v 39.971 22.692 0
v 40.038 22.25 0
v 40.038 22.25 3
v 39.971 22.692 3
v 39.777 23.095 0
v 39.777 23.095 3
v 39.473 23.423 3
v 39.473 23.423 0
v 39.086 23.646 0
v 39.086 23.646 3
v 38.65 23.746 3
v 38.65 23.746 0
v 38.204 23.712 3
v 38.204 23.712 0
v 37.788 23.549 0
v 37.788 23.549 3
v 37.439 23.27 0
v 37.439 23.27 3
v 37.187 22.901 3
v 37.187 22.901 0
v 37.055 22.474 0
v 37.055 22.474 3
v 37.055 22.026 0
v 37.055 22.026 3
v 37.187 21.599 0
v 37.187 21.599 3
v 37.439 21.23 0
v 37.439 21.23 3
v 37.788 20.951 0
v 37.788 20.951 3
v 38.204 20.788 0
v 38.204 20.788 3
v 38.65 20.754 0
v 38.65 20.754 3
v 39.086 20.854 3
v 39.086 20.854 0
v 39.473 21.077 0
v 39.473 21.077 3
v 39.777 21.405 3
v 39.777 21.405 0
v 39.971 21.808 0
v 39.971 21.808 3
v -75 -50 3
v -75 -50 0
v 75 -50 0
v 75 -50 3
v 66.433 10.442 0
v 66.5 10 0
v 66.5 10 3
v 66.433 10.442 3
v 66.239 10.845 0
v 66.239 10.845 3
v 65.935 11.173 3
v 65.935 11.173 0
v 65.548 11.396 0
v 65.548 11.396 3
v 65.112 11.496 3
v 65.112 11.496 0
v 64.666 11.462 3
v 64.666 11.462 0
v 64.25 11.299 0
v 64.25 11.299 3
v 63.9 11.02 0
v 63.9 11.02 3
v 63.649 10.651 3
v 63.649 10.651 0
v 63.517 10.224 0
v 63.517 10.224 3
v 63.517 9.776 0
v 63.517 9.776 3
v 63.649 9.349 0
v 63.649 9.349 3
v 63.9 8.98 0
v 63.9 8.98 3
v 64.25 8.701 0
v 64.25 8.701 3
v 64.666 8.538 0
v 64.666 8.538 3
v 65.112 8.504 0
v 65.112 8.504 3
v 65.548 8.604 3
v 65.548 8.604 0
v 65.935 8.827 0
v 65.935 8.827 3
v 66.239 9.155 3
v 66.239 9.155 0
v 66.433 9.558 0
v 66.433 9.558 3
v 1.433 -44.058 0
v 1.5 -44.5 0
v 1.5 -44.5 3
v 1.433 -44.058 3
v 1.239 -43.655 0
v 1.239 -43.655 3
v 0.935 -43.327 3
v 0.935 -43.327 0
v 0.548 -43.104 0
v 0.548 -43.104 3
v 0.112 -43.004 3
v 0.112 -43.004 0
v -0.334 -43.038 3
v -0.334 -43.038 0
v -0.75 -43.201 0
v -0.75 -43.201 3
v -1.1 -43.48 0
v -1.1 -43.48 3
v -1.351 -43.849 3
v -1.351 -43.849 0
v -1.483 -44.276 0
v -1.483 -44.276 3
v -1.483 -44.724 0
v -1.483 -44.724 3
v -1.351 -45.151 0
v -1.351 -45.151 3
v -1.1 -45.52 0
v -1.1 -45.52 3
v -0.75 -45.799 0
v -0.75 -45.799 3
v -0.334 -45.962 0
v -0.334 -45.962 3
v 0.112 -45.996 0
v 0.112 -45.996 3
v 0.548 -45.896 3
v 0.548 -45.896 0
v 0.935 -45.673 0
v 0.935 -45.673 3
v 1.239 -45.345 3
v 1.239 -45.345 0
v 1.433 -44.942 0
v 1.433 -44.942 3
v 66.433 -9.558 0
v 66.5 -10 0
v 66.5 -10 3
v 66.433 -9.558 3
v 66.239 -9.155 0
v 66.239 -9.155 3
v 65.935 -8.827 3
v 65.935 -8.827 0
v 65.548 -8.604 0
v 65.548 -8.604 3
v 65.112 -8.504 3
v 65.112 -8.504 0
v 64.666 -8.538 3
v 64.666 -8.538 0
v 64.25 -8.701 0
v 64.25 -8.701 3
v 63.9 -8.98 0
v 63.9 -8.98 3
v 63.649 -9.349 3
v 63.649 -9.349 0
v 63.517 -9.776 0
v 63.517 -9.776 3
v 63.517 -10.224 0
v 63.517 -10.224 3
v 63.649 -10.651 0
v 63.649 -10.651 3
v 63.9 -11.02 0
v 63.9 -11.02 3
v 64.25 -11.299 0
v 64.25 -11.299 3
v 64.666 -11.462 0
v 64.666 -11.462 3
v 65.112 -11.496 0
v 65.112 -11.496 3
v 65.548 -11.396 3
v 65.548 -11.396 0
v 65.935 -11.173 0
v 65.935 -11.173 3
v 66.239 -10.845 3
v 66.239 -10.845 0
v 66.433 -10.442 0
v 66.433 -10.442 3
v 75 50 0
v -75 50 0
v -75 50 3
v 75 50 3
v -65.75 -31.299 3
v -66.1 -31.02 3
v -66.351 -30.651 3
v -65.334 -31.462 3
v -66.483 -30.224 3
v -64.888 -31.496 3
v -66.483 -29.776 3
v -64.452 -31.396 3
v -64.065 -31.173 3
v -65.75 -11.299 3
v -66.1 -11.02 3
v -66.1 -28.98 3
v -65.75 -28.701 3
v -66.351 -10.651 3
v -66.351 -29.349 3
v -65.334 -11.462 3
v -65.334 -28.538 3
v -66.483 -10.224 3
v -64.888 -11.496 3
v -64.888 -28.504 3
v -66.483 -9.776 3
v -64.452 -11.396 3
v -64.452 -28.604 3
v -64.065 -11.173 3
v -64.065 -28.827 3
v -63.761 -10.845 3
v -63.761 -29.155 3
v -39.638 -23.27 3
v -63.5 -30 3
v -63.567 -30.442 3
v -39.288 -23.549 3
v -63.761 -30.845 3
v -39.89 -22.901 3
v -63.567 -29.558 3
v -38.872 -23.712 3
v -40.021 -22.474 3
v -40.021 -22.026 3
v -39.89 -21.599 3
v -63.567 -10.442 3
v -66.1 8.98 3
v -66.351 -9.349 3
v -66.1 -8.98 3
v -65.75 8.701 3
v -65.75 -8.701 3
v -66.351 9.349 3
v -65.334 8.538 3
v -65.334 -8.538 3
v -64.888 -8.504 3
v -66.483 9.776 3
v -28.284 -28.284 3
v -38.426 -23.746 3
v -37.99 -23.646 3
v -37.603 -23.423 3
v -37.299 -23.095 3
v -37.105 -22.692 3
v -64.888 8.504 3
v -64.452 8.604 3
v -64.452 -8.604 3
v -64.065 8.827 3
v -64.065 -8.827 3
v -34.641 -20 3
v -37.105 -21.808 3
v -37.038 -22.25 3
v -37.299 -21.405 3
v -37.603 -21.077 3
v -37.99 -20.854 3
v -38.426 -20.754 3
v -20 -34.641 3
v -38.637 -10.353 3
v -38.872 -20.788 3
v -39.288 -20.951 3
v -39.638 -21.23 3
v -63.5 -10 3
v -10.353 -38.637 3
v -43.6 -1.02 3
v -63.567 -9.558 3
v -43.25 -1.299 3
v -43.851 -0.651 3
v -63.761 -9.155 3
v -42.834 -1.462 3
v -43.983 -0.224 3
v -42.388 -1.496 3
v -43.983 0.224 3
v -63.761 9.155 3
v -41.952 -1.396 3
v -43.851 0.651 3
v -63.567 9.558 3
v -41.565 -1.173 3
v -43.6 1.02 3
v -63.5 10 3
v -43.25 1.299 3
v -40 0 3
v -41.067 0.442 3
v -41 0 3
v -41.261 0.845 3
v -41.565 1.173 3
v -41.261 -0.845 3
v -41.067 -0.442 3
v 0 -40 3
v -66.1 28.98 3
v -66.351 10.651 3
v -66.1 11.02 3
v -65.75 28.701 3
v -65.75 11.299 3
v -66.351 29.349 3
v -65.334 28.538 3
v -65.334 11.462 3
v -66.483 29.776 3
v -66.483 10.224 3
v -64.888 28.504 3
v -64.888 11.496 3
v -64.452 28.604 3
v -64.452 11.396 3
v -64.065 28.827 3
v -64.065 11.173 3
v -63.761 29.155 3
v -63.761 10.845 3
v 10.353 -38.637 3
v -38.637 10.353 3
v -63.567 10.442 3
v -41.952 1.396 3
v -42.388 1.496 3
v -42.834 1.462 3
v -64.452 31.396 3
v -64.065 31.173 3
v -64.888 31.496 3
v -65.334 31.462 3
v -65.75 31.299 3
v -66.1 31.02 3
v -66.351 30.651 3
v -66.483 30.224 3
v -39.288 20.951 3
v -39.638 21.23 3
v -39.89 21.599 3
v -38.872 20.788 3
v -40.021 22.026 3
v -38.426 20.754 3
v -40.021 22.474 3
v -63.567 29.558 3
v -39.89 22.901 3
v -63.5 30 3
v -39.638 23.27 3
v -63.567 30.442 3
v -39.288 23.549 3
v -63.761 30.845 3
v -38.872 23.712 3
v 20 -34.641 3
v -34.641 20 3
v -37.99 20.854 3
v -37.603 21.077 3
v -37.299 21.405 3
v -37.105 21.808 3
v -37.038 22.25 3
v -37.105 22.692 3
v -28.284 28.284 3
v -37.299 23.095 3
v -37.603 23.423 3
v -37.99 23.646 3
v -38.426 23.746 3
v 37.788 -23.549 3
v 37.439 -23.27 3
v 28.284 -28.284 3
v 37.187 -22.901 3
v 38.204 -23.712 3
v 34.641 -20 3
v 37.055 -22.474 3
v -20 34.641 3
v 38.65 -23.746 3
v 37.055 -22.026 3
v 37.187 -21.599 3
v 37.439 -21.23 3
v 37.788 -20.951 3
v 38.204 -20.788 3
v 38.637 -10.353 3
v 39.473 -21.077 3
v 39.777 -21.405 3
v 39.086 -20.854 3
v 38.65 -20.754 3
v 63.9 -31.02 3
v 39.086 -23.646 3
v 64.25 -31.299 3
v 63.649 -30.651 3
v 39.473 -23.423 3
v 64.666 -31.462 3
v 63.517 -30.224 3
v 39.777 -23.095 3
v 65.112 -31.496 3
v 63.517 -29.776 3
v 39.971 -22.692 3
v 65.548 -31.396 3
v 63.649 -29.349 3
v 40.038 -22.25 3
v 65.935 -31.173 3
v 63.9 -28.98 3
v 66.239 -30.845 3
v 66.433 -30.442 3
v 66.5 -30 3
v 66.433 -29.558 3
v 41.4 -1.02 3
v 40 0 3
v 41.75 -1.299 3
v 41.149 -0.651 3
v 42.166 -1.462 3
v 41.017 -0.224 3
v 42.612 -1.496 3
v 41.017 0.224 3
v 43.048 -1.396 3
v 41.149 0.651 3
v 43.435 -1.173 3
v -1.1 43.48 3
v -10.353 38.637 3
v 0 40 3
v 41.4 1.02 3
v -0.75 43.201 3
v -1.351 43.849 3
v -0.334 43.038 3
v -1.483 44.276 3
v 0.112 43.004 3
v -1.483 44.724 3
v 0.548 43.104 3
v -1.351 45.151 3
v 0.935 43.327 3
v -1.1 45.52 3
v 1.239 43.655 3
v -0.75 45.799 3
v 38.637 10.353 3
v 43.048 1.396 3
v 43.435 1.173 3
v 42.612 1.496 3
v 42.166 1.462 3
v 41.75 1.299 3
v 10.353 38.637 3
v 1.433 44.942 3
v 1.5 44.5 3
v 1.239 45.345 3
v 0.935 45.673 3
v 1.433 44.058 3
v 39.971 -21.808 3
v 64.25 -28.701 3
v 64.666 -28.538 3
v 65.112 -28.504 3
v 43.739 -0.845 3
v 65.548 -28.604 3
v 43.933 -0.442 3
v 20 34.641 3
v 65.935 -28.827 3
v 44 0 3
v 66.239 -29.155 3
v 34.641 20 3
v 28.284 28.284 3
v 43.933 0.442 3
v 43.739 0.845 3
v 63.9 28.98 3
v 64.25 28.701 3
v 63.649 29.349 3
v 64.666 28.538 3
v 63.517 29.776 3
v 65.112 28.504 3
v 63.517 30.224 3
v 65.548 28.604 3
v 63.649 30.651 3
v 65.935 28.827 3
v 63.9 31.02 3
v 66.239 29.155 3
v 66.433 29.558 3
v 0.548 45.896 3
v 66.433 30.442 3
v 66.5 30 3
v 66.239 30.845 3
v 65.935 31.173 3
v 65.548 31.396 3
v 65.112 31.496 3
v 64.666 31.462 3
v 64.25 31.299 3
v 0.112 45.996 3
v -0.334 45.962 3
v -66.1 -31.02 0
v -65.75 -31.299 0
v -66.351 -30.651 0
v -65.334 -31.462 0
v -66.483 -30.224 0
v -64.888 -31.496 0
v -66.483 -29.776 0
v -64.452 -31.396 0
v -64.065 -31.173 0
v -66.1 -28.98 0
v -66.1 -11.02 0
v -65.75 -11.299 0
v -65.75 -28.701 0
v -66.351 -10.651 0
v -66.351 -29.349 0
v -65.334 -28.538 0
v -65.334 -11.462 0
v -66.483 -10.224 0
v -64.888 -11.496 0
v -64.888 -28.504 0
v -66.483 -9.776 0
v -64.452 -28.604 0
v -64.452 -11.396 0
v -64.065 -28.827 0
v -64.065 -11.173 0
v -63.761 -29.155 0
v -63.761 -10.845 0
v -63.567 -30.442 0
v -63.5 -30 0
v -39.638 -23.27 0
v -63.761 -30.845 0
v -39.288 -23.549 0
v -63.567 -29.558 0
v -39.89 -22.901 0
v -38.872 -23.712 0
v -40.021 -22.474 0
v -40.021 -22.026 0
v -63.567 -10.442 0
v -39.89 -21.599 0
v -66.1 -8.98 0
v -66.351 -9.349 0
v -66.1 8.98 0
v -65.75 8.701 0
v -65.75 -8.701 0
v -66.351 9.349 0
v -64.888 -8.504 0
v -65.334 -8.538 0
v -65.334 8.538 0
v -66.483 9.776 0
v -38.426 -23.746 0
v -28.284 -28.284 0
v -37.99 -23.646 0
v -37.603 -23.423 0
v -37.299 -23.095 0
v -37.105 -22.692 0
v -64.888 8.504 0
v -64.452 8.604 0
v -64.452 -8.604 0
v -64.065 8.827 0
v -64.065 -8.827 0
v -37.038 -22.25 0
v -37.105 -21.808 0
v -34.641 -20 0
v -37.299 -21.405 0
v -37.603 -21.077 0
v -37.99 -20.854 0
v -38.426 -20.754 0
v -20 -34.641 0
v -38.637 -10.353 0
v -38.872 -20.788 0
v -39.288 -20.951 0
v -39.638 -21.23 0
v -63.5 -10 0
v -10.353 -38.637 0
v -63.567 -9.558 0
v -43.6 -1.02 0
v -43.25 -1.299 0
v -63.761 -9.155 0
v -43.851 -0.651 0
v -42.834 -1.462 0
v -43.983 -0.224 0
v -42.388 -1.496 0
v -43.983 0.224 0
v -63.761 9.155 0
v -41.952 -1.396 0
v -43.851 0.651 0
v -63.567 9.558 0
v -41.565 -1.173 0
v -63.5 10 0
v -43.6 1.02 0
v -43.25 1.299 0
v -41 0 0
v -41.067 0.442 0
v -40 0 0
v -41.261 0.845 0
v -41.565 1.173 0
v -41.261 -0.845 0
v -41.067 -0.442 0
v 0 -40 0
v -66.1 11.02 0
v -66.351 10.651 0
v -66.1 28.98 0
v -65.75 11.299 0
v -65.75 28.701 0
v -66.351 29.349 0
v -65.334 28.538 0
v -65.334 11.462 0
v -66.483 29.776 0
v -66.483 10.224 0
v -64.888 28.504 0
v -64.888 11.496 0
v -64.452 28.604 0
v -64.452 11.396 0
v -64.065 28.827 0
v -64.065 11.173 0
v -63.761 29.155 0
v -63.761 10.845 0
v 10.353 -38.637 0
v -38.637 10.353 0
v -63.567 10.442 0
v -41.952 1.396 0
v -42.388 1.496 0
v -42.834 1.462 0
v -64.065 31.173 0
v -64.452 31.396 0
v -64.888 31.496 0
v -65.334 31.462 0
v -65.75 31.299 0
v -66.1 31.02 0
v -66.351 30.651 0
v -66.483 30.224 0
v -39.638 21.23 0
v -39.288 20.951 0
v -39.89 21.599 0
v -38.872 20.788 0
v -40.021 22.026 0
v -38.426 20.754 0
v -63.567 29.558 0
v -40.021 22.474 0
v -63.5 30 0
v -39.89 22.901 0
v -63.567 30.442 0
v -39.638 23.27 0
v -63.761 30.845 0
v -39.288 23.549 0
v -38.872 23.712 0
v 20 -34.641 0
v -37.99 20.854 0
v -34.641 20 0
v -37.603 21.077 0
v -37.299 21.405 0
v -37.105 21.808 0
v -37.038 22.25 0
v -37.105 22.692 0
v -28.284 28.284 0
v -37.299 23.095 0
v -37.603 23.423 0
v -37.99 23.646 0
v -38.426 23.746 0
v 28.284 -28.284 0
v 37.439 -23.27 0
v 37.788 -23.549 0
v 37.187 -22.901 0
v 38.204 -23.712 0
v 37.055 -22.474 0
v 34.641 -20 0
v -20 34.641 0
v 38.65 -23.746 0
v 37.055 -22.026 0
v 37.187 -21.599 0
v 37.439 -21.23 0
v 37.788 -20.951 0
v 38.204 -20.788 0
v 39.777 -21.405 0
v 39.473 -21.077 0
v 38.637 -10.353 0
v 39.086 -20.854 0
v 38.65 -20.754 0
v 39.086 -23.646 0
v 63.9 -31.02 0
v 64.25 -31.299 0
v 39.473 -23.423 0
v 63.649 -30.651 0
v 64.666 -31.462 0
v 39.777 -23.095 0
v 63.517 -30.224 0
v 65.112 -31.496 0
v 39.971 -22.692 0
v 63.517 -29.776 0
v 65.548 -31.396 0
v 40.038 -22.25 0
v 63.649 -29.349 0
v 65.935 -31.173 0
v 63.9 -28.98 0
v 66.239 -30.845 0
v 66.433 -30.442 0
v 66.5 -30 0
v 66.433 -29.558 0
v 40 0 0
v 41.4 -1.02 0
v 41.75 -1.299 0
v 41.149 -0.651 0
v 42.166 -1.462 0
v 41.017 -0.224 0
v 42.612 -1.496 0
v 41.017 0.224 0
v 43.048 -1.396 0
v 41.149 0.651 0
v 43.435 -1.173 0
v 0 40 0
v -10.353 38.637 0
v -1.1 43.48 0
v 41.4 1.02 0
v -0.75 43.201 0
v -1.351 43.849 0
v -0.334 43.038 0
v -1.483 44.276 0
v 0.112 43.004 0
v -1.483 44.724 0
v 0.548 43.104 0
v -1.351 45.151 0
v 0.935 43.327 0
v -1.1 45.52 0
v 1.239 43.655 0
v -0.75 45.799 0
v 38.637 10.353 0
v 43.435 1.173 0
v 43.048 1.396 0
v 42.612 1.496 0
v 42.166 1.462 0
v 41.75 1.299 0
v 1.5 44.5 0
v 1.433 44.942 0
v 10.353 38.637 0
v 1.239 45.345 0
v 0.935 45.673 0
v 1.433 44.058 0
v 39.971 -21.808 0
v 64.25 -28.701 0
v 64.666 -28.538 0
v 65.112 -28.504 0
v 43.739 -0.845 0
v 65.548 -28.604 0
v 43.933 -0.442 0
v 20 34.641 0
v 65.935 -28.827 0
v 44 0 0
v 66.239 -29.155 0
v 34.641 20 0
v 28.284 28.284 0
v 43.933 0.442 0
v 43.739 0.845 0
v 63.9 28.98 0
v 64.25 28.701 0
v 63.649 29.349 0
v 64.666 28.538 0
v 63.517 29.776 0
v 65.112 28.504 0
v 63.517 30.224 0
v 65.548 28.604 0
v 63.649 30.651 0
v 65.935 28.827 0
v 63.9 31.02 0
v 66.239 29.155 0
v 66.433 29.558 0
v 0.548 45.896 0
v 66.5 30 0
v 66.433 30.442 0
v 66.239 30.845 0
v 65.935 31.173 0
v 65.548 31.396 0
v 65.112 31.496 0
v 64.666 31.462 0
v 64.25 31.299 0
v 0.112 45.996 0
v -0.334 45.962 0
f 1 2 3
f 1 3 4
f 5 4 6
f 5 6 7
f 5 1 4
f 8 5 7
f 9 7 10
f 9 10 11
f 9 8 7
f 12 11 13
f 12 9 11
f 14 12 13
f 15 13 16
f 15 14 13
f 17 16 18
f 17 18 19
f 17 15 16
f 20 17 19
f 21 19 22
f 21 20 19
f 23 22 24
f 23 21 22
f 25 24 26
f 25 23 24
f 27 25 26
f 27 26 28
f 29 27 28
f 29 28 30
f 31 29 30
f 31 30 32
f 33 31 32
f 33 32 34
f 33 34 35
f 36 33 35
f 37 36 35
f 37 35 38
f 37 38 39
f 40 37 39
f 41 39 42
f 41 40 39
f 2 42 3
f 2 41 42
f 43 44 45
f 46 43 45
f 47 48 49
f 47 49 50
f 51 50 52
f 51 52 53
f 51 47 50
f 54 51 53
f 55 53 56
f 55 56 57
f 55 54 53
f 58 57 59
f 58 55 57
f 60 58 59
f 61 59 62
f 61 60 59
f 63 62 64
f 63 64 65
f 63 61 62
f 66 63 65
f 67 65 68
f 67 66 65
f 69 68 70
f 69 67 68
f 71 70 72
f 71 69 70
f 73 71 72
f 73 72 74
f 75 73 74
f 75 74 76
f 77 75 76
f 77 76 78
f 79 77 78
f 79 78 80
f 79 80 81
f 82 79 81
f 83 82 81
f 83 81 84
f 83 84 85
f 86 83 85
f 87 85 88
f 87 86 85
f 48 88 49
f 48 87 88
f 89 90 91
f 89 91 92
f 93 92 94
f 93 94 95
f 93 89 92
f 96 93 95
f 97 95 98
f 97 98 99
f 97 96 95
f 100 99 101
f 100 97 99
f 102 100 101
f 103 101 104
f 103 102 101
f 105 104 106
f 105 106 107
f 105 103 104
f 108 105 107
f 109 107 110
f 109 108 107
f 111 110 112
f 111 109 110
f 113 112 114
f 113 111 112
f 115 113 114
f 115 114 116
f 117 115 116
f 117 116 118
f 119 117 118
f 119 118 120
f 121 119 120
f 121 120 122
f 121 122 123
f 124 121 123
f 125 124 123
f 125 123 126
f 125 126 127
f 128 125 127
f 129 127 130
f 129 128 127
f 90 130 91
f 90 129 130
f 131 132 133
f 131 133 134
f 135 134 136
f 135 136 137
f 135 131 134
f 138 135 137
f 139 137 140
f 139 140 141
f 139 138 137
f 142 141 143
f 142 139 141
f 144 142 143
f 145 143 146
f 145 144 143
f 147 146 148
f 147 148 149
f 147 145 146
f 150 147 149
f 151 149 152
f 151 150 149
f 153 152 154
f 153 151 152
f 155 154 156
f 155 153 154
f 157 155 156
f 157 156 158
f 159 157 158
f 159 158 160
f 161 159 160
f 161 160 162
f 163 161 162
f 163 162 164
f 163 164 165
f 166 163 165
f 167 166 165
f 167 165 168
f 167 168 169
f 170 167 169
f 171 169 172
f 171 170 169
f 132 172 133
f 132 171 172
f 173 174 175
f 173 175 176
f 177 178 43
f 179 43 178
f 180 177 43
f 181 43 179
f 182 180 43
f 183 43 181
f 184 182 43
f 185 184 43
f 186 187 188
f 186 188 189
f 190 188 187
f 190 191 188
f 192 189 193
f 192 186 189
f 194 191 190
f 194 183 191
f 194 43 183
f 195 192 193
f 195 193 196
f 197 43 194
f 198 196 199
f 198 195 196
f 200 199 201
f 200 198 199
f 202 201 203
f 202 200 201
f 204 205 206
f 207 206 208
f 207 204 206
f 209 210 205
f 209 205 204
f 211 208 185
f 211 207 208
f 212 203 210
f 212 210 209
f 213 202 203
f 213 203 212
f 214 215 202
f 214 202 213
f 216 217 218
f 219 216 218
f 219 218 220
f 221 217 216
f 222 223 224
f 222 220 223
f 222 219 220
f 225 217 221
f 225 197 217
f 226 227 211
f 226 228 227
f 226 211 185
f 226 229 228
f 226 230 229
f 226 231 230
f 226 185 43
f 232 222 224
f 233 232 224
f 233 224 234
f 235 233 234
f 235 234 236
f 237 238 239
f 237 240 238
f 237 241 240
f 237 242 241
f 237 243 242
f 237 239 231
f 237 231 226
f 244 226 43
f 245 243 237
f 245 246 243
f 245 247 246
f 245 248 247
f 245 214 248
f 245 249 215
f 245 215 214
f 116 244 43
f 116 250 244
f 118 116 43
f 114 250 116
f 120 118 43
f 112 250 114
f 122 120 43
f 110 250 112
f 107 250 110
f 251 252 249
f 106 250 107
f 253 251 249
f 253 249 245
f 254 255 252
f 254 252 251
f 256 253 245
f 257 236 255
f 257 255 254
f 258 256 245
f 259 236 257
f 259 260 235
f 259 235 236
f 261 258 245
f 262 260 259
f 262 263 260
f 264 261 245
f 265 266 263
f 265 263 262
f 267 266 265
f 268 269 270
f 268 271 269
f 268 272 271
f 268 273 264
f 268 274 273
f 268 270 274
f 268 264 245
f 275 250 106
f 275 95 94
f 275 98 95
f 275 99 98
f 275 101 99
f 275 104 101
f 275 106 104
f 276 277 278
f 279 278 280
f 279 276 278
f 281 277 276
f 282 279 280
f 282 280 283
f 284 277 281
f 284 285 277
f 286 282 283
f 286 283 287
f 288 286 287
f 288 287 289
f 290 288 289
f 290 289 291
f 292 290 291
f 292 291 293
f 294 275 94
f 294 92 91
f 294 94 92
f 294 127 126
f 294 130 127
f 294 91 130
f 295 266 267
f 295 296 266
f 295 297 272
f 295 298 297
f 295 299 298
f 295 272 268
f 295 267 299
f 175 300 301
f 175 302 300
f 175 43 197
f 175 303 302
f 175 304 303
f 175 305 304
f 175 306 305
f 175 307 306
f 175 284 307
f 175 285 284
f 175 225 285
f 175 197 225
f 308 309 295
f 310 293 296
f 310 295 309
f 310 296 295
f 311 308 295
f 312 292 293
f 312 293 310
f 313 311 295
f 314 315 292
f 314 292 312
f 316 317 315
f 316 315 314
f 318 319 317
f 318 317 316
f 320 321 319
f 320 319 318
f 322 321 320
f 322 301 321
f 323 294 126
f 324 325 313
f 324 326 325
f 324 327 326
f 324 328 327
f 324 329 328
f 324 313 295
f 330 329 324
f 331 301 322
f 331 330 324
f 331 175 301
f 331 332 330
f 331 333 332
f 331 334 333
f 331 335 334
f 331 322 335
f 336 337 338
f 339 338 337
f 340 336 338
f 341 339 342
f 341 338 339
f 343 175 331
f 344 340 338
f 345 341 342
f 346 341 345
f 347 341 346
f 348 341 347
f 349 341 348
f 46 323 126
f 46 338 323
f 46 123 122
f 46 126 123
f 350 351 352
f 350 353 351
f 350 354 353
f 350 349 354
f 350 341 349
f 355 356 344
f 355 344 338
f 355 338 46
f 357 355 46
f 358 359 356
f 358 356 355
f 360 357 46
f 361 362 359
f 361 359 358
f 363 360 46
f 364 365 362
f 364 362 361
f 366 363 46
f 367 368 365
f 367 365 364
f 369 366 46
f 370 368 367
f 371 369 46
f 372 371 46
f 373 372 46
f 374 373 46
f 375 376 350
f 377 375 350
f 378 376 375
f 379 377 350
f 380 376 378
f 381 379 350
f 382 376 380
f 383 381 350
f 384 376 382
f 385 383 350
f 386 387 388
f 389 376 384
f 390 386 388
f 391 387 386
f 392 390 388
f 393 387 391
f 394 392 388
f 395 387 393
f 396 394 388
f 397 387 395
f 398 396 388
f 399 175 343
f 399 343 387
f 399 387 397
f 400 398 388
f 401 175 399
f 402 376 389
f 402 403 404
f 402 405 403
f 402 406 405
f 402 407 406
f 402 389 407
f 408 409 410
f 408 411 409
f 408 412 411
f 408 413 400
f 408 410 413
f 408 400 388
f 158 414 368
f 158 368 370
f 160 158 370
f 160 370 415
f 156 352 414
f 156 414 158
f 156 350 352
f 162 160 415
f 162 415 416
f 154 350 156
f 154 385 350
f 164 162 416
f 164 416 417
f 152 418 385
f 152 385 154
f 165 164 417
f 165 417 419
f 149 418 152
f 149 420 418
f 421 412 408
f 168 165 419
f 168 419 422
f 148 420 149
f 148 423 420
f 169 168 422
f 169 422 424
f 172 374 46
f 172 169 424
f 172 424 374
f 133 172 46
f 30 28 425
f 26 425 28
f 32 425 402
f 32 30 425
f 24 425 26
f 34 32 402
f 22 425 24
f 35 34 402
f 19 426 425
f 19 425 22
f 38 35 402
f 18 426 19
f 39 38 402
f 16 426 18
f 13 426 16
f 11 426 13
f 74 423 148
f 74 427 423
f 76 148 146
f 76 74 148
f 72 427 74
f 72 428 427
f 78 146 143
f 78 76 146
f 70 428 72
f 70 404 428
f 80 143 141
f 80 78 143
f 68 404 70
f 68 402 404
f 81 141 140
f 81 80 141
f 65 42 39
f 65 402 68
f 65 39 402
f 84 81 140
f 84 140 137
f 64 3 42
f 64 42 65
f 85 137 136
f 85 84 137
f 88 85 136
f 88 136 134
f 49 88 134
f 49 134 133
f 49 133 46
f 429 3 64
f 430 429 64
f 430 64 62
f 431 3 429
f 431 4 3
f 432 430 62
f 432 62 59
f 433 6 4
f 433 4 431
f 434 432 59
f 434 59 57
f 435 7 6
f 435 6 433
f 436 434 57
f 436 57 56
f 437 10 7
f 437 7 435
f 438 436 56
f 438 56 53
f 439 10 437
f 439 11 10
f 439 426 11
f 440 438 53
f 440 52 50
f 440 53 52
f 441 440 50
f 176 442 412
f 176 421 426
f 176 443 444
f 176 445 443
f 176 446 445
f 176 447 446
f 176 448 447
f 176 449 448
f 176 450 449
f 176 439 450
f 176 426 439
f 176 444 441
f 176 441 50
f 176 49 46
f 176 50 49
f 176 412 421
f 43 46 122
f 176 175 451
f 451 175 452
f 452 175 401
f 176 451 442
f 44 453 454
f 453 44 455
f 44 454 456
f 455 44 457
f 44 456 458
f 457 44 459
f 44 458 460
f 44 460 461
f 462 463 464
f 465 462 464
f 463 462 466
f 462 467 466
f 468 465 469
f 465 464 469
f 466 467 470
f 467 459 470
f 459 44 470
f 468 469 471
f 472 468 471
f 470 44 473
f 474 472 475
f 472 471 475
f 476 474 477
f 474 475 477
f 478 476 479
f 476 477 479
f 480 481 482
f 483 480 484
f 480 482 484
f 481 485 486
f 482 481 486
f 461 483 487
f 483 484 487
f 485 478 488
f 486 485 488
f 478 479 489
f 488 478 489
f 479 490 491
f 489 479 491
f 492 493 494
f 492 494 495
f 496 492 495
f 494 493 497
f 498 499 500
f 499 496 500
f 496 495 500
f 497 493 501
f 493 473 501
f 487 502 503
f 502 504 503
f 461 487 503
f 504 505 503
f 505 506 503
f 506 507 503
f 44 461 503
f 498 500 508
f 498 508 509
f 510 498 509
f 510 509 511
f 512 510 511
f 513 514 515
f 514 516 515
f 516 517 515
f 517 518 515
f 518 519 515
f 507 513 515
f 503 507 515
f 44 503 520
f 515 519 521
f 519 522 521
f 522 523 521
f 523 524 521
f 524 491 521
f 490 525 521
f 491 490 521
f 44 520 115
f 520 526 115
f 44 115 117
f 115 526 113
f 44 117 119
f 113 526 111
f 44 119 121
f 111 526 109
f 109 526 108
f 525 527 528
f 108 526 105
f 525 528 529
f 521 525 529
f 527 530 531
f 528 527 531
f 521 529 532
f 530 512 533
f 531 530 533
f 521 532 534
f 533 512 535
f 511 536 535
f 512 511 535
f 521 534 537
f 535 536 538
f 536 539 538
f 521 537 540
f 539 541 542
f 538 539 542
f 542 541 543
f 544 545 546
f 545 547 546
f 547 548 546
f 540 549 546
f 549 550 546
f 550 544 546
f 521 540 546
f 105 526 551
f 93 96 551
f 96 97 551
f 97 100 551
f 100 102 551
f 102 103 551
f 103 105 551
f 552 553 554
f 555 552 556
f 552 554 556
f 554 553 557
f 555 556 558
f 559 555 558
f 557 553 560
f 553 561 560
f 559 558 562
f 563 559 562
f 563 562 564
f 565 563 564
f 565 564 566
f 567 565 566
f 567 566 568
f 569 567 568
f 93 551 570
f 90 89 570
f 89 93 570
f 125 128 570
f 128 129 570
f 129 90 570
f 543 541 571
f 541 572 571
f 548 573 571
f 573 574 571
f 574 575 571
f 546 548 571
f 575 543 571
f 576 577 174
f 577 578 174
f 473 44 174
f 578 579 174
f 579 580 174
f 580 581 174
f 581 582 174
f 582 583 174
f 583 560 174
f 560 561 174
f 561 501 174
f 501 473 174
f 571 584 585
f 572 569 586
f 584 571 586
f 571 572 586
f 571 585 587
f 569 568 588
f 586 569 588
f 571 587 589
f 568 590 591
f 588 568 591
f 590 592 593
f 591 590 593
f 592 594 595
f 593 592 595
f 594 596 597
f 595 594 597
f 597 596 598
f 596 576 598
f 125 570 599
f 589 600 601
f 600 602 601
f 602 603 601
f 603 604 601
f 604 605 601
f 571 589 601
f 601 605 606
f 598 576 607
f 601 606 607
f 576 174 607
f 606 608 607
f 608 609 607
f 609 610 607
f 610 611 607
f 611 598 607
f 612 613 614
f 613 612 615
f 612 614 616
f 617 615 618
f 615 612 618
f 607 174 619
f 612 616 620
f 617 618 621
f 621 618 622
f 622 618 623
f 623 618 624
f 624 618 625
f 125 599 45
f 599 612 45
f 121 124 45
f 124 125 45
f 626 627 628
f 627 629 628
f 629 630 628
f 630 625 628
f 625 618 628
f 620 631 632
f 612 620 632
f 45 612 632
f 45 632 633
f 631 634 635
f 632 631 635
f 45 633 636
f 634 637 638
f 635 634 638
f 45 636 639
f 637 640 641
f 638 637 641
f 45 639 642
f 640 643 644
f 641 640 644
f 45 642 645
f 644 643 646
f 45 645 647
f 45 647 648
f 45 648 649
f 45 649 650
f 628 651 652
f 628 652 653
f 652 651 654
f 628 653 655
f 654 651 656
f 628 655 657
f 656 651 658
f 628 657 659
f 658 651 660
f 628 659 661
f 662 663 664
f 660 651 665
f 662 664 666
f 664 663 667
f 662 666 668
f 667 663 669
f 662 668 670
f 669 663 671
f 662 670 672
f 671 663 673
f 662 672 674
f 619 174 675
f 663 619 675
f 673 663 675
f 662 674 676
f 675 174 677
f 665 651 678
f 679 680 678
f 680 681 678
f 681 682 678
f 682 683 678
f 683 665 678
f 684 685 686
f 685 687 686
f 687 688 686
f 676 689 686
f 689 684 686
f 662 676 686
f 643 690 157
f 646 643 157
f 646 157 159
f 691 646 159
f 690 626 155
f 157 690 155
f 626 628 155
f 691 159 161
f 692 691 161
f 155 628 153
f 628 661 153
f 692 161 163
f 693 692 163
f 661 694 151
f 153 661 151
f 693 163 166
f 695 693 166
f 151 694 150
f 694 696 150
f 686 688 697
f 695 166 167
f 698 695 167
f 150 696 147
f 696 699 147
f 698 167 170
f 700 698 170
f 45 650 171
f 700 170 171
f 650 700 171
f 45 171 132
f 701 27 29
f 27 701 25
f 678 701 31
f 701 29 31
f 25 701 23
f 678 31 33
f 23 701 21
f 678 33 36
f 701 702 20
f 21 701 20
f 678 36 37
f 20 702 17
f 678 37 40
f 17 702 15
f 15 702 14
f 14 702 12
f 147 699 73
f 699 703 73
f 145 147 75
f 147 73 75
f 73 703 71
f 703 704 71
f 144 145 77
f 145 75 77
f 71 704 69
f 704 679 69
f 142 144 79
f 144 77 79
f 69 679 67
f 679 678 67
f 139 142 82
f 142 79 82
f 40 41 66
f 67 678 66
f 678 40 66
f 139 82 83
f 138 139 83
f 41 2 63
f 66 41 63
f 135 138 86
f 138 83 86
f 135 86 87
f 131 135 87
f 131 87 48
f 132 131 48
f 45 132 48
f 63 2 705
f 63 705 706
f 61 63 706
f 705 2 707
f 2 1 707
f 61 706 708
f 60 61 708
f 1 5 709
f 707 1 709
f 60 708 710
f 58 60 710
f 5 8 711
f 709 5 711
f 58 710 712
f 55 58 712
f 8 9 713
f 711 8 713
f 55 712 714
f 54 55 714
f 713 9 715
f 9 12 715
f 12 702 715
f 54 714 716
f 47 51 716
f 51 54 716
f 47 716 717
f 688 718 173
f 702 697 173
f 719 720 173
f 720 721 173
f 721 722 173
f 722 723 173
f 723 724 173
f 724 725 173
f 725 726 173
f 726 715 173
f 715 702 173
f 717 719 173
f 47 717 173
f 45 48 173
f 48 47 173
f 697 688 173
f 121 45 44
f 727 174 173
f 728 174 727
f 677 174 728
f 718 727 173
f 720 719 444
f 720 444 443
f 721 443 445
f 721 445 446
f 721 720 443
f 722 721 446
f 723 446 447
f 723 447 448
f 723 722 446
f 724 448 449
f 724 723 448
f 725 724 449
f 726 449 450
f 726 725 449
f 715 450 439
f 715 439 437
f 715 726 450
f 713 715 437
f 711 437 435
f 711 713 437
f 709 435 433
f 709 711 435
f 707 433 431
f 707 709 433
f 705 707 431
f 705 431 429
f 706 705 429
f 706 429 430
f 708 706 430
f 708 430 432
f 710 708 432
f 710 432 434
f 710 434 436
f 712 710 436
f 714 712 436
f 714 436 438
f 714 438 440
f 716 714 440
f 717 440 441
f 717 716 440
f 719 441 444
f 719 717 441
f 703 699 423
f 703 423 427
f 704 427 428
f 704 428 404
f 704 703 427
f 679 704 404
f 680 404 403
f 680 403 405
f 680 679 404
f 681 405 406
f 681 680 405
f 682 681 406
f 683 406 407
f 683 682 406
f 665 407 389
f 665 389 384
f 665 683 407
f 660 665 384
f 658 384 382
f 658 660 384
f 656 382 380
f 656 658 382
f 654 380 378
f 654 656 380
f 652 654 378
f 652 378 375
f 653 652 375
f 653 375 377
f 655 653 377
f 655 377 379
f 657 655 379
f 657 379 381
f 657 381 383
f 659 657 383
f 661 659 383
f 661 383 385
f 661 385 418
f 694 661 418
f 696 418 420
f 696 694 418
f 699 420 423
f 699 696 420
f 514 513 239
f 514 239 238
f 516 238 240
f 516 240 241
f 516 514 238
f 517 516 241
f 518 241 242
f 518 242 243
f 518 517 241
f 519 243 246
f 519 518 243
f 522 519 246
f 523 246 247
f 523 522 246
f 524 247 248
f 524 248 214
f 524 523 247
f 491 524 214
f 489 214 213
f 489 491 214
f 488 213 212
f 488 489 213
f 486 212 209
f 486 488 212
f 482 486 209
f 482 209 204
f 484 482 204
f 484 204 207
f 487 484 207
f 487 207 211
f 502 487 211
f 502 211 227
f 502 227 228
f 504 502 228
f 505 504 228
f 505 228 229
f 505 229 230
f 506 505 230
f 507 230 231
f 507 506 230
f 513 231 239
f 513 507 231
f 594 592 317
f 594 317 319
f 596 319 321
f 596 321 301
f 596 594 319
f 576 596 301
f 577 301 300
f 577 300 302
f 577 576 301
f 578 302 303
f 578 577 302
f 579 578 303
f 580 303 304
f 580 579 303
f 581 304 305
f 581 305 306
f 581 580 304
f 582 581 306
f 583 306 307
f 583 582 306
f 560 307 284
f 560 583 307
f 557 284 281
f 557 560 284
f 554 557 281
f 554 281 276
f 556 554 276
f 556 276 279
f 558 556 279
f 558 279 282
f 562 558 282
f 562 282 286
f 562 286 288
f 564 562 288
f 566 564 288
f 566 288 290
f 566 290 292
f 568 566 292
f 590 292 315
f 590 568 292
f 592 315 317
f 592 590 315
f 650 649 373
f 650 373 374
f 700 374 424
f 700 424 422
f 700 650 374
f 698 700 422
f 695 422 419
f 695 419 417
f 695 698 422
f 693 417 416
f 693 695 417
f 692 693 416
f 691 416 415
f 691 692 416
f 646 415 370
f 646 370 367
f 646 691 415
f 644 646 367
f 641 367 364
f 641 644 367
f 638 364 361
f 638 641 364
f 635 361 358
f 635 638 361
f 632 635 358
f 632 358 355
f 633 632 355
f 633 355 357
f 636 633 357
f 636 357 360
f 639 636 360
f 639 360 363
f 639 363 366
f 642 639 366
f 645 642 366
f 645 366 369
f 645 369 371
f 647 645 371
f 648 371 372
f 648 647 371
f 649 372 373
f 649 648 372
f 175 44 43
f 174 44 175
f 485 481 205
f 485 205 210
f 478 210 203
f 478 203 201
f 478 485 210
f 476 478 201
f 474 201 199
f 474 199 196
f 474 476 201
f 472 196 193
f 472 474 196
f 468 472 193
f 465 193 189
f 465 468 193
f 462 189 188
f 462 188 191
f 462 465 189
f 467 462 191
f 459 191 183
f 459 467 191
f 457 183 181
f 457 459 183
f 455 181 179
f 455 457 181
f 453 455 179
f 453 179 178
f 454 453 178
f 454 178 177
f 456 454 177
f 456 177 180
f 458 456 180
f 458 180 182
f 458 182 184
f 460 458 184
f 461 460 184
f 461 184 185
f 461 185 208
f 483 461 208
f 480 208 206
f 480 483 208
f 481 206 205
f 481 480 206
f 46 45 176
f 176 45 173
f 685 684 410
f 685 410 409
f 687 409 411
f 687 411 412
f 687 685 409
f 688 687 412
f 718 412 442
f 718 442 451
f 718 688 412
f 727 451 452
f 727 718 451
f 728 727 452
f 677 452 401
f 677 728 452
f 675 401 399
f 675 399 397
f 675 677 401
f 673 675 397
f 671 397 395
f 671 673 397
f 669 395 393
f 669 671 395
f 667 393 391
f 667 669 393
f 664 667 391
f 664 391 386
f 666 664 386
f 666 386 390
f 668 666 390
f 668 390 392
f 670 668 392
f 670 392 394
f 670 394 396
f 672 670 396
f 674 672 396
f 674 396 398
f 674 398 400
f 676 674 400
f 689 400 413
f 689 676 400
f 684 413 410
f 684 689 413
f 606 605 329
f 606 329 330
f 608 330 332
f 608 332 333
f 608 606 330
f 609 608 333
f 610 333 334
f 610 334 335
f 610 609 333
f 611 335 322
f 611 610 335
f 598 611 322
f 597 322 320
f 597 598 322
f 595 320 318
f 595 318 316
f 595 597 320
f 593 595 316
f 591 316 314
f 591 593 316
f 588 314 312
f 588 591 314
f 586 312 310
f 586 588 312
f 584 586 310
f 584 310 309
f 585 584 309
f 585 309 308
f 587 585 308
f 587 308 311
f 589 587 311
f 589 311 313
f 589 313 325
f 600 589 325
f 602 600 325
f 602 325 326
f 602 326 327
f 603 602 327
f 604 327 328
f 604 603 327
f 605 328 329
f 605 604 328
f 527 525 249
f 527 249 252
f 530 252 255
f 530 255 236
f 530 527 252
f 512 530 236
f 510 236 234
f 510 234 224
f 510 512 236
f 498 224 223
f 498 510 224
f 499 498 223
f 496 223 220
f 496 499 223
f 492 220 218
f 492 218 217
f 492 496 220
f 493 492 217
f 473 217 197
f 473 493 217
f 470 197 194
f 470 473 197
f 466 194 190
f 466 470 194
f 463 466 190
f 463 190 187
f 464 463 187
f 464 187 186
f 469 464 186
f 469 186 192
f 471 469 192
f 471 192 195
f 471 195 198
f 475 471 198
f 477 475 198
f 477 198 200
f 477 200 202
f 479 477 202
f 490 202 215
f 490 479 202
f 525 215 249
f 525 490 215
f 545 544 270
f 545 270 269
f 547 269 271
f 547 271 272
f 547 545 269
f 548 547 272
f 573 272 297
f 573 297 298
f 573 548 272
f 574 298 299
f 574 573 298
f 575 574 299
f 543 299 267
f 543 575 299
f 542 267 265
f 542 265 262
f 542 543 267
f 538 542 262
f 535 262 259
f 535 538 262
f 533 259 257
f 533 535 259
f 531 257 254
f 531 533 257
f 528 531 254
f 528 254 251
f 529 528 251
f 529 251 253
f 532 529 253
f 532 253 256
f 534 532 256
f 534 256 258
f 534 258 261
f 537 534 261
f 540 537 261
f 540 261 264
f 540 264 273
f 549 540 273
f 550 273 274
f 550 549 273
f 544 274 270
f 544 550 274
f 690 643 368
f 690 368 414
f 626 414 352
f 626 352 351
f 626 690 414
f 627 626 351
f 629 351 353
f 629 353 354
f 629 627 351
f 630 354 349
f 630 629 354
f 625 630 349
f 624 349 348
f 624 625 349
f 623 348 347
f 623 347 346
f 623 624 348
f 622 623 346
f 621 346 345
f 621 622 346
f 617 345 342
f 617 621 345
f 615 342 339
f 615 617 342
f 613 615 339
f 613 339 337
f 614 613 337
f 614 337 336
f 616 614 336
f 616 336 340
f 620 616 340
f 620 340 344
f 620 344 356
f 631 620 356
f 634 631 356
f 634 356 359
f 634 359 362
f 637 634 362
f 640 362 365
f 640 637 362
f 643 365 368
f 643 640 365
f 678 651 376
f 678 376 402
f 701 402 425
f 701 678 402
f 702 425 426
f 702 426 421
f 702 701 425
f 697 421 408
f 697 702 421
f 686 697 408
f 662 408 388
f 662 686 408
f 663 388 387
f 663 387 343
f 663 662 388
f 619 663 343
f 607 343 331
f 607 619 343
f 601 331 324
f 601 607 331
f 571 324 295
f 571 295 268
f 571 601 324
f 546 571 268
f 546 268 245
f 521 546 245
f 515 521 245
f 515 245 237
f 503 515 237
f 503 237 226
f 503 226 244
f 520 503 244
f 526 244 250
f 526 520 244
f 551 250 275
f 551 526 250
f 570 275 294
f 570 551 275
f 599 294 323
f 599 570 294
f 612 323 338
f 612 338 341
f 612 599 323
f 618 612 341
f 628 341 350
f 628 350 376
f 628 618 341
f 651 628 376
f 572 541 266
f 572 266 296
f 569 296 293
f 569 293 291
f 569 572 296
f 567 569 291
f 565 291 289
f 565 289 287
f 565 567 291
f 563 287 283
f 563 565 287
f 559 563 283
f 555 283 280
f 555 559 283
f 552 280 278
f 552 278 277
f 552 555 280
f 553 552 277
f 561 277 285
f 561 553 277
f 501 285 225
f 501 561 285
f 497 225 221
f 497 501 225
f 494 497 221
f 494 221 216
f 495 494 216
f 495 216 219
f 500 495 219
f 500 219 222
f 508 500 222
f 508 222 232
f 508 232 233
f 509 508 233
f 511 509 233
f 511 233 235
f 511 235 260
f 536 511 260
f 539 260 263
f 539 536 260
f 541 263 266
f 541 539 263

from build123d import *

# Parameters (mm, degrees)
SKETCH_1_W      = 150
SKETCH_1_H      = 100
SKETCH_1_R      = 1.5
SKETCH_1_R_2    = 40
EXTRUDE_2_DEPTH = 3


with BuildPart() as part:
    # 草图1 → 凸台-拉伸2 (new body)
    with BuildSketch(Plane.XY):
        Rectangle(SKETCH_1_W, SKETCH_1_H)
        with Locations((-38.538130468, 22.25)):
            Circle(SKETCH_1_R, mode=Mode.SUBTRACT)
        with Locations((-38.538130468, -22.25)):
            Circle(SKETCH_1_R, mode=Mode.SUBTRACT)
        with Locations((0, -44.5)):
            Circle(SKETCH_1_R, mode=Mode.SUBTRACT)
        with Locations((38.538130468, -22.25)):
            Circle(SKETCH_1_R, mode=Mode.SUBTRACT)
        with Locations((38.538130468, 22.25)):
            Circle(SKETCH_1_R, mode=Mode.SUBTRACT)
        with Locations((0, 44.5)):
            Circle(SKETCH_1_R, mode=Mode.SUBTRACT)
        with Locations((-42.5, 0)):
            Circle(SKETCH_1_R, mode=Mode.SUBTRACT)
        with Locations((42.5, 0)):
            Circle(SKETCH_1_R, mode=Mode.SUBTRACT)
        Circle(SKETCH_1_R_2, mode=Mode.SUBTRACT)
        with Locations((65, 10)):
            Circle(SKETCH_1_R, mode=Mode.SUBTRACT)
        with Locations((65, -30)):
            Circle(SKETCH_1_R, mode=Mode.SUBTRACT)
        with Locations((-65, -30)):
            Circle(SKETCH_1_R, mode=Mode.SUBTRACT)
        with Locations((-65, -10)):
            Circle(SKETCH_1_R, mode=Mode.SUBTRACT)
        with Locations((-65, 10)):
            Circle(SKETCH_1_R, mode=Mode.SUBTRACT)
        with Locations((-65, 30)):
            Circle(SKETCH_1_R, mode=Mode.SUBTRACT)
        with Locations((65, -10)):
            Circle(SKETCH_1_R, mode=Mode.SUBTRACT)
        with Locations((65, 30)):
            Circle(SKETCH_1_R, mode=Mode.SUBTRACT)
    extrude(amount=EXTRUDE_2_DEPTH)


solid = part.part
